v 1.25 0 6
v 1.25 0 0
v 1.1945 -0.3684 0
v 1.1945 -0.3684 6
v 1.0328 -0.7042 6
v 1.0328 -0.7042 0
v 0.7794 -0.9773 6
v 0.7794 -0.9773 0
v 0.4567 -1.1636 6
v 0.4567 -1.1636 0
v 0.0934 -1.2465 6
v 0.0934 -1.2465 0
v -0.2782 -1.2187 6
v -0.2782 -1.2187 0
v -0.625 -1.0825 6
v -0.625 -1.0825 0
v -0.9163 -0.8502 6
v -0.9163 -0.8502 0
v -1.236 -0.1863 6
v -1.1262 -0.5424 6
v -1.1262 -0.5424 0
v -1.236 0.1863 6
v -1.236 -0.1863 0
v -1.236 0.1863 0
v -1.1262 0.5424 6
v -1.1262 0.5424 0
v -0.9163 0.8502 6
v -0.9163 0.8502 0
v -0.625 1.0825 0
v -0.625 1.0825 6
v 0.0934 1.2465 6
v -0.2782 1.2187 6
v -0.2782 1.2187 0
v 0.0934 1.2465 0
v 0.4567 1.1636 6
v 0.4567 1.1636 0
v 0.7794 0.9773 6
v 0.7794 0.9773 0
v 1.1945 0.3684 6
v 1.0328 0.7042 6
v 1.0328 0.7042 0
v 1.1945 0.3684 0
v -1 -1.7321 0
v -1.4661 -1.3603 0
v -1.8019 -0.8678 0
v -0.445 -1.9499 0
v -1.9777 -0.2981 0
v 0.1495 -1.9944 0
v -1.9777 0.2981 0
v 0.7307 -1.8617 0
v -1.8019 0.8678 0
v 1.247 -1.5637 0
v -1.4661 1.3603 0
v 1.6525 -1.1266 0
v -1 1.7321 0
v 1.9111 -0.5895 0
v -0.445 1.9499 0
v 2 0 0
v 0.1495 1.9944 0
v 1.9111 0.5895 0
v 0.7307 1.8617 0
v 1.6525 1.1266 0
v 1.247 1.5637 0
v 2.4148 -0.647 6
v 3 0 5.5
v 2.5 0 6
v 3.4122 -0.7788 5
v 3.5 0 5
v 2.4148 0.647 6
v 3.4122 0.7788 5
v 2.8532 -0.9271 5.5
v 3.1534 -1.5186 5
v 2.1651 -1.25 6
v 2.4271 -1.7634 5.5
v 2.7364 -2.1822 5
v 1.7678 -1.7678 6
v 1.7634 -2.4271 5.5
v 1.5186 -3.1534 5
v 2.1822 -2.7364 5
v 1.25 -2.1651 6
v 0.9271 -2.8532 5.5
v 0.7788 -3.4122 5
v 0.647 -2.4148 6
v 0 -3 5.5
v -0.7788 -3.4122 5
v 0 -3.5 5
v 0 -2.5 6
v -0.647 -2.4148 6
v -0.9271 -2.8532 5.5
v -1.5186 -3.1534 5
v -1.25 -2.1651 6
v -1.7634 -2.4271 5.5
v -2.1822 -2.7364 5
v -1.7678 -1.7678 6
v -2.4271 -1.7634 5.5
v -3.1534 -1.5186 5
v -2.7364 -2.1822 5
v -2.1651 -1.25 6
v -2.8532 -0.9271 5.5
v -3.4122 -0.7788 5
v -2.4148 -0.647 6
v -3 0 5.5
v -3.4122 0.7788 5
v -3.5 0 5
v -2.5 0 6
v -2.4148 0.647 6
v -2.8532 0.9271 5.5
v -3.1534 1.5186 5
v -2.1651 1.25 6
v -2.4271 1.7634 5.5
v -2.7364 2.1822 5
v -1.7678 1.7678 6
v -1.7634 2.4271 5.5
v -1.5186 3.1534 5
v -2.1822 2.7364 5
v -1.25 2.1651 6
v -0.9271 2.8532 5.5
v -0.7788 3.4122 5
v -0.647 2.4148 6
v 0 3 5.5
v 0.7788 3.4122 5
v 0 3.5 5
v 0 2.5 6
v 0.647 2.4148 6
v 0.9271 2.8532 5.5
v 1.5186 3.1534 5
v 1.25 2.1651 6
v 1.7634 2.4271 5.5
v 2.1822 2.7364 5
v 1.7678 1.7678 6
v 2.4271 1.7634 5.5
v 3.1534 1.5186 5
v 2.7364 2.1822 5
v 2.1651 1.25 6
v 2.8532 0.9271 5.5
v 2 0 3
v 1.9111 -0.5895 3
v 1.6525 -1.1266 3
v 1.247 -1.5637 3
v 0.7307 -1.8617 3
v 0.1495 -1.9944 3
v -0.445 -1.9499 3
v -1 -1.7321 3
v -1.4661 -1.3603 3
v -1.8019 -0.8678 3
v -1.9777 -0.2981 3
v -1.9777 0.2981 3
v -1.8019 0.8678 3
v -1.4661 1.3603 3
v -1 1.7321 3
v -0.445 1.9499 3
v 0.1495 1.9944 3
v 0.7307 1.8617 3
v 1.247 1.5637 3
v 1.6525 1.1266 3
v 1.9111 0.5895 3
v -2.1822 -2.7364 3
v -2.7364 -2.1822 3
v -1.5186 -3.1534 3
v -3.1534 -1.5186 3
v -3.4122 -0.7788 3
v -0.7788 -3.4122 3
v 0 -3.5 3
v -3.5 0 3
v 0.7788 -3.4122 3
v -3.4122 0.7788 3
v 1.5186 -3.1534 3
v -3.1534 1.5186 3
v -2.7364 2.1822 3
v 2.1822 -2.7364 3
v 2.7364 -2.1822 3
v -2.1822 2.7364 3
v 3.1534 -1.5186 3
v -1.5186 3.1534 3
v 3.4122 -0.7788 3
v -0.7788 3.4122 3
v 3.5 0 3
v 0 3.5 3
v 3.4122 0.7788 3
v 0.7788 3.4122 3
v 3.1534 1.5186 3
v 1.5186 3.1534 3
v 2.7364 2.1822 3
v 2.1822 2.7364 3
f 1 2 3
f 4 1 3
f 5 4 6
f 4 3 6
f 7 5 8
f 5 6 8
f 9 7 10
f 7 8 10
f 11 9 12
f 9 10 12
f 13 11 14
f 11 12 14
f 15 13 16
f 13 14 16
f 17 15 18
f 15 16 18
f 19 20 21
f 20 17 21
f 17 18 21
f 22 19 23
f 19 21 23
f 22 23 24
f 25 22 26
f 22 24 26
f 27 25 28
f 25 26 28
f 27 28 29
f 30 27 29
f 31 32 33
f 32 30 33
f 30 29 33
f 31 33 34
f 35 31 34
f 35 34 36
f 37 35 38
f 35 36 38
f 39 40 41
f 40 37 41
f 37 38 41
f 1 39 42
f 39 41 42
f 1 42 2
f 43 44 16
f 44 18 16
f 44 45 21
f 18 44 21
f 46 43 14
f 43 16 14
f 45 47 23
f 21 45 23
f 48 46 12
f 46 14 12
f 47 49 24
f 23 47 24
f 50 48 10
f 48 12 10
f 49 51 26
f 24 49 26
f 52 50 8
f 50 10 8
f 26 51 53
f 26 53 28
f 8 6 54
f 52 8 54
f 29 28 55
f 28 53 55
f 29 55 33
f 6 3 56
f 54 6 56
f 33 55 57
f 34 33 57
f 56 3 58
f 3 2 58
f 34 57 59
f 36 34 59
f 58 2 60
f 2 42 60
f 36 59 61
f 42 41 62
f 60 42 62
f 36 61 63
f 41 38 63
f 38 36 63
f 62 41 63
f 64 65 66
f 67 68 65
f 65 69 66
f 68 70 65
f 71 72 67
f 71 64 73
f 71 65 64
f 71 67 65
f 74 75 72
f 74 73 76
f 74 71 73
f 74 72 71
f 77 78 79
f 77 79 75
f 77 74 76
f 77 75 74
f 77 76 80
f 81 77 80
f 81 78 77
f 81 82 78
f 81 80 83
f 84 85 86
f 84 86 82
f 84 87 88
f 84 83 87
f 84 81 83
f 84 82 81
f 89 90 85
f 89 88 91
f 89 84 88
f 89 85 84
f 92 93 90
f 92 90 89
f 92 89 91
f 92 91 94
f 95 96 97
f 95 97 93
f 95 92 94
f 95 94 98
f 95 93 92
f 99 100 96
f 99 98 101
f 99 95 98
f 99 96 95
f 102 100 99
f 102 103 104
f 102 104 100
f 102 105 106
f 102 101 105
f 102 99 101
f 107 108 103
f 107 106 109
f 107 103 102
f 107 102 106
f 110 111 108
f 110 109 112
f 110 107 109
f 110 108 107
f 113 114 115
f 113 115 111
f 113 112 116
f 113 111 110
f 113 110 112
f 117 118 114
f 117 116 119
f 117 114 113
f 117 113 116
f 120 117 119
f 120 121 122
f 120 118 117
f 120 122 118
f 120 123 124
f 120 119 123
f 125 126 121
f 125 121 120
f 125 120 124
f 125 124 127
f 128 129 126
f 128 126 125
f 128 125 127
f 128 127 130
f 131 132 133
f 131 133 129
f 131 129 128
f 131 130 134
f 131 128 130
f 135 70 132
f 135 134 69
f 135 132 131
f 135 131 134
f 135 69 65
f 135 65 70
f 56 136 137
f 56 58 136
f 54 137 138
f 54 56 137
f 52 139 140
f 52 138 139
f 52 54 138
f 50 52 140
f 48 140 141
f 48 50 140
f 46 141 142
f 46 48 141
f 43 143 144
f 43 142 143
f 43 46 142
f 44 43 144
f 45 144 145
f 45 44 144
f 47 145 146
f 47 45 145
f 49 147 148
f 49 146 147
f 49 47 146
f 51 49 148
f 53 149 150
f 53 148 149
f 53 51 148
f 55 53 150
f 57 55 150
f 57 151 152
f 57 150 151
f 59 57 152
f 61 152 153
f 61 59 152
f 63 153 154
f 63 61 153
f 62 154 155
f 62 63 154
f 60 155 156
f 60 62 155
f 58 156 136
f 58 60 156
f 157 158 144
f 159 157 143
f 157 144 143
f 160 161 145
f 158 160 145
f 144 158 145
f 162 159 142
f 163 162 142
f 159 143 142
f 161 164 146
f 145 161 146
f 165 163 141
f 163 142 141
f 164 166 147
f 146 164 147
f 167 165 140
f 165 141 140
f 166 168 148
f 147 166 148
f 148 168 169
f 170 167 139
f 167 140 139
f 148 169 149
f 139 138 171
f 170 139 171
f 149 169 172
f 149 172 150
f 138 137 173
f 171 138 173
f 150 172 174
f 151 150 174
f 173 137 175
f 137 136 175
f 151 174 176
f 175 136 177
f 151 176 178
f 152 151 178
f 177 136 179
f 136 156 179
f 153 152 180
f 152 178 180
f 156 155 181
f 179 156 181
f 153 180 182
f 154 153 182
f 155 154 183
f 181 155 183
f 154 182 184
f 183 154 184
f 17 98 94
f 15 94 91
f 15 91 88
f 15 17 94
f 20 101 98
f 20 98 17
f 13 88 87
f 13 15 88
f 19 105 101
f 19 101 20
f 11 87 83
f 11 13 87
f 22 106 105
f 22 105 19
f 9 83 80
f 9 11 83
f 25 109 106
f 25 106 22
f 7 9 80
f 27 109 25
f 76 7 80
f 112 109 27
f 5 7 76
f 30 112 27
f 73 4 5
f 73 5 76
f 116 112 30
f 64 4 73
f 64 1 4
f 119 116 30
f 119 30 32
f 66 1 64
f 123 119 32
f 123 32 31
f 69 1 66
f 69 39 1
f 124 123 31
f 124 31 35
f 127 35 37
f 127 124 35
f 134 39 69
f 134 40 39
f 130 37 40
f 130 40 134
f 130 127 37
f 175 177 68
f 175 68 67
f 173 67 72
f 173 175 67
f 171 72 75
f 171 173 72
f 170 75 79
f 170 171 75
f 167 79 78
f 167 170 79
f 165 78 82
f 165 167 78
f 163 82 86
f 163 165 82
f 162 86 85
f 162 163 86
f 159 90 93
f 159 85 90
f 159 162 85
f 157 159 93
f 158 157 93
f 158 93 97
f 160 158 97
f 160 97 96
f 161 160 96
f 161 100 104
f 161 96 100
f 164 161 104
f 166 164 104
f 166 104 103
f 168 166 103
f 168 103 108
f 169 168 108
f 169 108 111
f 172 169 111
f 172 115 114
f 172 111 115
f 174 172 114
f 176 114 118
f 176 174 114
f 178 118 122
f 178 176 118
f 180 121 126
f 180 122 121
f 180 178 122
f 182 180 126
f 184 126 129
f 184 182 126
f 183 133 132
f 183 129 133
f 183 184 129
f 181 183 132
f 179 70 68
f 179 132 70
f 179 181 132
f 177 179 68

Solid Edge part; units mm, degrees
sketch "Sketch1" plane through (0, 0, 0) normal (0, 0, 1) x (1, 0, 0)
  circle A0 centre (0, 0) radius 1.25
  circle A1 centre (0, 0) radius 2
extrude "Protrusion1" add sketch "Sketch1" along normal blind 3
sketch "Sketch2" plane through (0, 0, 3) normal (0, 0, 1) x (1, 0, 0)
  circle A0 centre (0, 0) radius 1.25
  circle A1 centre (0, 0) radius 3.5
extrude "ExtrudedProtrusion_2" add sketch "Sketch2" along normal blind 3
chamfer "Chamfer_1" distance 1 angle 45 1 edges at (-3.5, 0, 6)
properties material "ABS Plastic, medium impact"
